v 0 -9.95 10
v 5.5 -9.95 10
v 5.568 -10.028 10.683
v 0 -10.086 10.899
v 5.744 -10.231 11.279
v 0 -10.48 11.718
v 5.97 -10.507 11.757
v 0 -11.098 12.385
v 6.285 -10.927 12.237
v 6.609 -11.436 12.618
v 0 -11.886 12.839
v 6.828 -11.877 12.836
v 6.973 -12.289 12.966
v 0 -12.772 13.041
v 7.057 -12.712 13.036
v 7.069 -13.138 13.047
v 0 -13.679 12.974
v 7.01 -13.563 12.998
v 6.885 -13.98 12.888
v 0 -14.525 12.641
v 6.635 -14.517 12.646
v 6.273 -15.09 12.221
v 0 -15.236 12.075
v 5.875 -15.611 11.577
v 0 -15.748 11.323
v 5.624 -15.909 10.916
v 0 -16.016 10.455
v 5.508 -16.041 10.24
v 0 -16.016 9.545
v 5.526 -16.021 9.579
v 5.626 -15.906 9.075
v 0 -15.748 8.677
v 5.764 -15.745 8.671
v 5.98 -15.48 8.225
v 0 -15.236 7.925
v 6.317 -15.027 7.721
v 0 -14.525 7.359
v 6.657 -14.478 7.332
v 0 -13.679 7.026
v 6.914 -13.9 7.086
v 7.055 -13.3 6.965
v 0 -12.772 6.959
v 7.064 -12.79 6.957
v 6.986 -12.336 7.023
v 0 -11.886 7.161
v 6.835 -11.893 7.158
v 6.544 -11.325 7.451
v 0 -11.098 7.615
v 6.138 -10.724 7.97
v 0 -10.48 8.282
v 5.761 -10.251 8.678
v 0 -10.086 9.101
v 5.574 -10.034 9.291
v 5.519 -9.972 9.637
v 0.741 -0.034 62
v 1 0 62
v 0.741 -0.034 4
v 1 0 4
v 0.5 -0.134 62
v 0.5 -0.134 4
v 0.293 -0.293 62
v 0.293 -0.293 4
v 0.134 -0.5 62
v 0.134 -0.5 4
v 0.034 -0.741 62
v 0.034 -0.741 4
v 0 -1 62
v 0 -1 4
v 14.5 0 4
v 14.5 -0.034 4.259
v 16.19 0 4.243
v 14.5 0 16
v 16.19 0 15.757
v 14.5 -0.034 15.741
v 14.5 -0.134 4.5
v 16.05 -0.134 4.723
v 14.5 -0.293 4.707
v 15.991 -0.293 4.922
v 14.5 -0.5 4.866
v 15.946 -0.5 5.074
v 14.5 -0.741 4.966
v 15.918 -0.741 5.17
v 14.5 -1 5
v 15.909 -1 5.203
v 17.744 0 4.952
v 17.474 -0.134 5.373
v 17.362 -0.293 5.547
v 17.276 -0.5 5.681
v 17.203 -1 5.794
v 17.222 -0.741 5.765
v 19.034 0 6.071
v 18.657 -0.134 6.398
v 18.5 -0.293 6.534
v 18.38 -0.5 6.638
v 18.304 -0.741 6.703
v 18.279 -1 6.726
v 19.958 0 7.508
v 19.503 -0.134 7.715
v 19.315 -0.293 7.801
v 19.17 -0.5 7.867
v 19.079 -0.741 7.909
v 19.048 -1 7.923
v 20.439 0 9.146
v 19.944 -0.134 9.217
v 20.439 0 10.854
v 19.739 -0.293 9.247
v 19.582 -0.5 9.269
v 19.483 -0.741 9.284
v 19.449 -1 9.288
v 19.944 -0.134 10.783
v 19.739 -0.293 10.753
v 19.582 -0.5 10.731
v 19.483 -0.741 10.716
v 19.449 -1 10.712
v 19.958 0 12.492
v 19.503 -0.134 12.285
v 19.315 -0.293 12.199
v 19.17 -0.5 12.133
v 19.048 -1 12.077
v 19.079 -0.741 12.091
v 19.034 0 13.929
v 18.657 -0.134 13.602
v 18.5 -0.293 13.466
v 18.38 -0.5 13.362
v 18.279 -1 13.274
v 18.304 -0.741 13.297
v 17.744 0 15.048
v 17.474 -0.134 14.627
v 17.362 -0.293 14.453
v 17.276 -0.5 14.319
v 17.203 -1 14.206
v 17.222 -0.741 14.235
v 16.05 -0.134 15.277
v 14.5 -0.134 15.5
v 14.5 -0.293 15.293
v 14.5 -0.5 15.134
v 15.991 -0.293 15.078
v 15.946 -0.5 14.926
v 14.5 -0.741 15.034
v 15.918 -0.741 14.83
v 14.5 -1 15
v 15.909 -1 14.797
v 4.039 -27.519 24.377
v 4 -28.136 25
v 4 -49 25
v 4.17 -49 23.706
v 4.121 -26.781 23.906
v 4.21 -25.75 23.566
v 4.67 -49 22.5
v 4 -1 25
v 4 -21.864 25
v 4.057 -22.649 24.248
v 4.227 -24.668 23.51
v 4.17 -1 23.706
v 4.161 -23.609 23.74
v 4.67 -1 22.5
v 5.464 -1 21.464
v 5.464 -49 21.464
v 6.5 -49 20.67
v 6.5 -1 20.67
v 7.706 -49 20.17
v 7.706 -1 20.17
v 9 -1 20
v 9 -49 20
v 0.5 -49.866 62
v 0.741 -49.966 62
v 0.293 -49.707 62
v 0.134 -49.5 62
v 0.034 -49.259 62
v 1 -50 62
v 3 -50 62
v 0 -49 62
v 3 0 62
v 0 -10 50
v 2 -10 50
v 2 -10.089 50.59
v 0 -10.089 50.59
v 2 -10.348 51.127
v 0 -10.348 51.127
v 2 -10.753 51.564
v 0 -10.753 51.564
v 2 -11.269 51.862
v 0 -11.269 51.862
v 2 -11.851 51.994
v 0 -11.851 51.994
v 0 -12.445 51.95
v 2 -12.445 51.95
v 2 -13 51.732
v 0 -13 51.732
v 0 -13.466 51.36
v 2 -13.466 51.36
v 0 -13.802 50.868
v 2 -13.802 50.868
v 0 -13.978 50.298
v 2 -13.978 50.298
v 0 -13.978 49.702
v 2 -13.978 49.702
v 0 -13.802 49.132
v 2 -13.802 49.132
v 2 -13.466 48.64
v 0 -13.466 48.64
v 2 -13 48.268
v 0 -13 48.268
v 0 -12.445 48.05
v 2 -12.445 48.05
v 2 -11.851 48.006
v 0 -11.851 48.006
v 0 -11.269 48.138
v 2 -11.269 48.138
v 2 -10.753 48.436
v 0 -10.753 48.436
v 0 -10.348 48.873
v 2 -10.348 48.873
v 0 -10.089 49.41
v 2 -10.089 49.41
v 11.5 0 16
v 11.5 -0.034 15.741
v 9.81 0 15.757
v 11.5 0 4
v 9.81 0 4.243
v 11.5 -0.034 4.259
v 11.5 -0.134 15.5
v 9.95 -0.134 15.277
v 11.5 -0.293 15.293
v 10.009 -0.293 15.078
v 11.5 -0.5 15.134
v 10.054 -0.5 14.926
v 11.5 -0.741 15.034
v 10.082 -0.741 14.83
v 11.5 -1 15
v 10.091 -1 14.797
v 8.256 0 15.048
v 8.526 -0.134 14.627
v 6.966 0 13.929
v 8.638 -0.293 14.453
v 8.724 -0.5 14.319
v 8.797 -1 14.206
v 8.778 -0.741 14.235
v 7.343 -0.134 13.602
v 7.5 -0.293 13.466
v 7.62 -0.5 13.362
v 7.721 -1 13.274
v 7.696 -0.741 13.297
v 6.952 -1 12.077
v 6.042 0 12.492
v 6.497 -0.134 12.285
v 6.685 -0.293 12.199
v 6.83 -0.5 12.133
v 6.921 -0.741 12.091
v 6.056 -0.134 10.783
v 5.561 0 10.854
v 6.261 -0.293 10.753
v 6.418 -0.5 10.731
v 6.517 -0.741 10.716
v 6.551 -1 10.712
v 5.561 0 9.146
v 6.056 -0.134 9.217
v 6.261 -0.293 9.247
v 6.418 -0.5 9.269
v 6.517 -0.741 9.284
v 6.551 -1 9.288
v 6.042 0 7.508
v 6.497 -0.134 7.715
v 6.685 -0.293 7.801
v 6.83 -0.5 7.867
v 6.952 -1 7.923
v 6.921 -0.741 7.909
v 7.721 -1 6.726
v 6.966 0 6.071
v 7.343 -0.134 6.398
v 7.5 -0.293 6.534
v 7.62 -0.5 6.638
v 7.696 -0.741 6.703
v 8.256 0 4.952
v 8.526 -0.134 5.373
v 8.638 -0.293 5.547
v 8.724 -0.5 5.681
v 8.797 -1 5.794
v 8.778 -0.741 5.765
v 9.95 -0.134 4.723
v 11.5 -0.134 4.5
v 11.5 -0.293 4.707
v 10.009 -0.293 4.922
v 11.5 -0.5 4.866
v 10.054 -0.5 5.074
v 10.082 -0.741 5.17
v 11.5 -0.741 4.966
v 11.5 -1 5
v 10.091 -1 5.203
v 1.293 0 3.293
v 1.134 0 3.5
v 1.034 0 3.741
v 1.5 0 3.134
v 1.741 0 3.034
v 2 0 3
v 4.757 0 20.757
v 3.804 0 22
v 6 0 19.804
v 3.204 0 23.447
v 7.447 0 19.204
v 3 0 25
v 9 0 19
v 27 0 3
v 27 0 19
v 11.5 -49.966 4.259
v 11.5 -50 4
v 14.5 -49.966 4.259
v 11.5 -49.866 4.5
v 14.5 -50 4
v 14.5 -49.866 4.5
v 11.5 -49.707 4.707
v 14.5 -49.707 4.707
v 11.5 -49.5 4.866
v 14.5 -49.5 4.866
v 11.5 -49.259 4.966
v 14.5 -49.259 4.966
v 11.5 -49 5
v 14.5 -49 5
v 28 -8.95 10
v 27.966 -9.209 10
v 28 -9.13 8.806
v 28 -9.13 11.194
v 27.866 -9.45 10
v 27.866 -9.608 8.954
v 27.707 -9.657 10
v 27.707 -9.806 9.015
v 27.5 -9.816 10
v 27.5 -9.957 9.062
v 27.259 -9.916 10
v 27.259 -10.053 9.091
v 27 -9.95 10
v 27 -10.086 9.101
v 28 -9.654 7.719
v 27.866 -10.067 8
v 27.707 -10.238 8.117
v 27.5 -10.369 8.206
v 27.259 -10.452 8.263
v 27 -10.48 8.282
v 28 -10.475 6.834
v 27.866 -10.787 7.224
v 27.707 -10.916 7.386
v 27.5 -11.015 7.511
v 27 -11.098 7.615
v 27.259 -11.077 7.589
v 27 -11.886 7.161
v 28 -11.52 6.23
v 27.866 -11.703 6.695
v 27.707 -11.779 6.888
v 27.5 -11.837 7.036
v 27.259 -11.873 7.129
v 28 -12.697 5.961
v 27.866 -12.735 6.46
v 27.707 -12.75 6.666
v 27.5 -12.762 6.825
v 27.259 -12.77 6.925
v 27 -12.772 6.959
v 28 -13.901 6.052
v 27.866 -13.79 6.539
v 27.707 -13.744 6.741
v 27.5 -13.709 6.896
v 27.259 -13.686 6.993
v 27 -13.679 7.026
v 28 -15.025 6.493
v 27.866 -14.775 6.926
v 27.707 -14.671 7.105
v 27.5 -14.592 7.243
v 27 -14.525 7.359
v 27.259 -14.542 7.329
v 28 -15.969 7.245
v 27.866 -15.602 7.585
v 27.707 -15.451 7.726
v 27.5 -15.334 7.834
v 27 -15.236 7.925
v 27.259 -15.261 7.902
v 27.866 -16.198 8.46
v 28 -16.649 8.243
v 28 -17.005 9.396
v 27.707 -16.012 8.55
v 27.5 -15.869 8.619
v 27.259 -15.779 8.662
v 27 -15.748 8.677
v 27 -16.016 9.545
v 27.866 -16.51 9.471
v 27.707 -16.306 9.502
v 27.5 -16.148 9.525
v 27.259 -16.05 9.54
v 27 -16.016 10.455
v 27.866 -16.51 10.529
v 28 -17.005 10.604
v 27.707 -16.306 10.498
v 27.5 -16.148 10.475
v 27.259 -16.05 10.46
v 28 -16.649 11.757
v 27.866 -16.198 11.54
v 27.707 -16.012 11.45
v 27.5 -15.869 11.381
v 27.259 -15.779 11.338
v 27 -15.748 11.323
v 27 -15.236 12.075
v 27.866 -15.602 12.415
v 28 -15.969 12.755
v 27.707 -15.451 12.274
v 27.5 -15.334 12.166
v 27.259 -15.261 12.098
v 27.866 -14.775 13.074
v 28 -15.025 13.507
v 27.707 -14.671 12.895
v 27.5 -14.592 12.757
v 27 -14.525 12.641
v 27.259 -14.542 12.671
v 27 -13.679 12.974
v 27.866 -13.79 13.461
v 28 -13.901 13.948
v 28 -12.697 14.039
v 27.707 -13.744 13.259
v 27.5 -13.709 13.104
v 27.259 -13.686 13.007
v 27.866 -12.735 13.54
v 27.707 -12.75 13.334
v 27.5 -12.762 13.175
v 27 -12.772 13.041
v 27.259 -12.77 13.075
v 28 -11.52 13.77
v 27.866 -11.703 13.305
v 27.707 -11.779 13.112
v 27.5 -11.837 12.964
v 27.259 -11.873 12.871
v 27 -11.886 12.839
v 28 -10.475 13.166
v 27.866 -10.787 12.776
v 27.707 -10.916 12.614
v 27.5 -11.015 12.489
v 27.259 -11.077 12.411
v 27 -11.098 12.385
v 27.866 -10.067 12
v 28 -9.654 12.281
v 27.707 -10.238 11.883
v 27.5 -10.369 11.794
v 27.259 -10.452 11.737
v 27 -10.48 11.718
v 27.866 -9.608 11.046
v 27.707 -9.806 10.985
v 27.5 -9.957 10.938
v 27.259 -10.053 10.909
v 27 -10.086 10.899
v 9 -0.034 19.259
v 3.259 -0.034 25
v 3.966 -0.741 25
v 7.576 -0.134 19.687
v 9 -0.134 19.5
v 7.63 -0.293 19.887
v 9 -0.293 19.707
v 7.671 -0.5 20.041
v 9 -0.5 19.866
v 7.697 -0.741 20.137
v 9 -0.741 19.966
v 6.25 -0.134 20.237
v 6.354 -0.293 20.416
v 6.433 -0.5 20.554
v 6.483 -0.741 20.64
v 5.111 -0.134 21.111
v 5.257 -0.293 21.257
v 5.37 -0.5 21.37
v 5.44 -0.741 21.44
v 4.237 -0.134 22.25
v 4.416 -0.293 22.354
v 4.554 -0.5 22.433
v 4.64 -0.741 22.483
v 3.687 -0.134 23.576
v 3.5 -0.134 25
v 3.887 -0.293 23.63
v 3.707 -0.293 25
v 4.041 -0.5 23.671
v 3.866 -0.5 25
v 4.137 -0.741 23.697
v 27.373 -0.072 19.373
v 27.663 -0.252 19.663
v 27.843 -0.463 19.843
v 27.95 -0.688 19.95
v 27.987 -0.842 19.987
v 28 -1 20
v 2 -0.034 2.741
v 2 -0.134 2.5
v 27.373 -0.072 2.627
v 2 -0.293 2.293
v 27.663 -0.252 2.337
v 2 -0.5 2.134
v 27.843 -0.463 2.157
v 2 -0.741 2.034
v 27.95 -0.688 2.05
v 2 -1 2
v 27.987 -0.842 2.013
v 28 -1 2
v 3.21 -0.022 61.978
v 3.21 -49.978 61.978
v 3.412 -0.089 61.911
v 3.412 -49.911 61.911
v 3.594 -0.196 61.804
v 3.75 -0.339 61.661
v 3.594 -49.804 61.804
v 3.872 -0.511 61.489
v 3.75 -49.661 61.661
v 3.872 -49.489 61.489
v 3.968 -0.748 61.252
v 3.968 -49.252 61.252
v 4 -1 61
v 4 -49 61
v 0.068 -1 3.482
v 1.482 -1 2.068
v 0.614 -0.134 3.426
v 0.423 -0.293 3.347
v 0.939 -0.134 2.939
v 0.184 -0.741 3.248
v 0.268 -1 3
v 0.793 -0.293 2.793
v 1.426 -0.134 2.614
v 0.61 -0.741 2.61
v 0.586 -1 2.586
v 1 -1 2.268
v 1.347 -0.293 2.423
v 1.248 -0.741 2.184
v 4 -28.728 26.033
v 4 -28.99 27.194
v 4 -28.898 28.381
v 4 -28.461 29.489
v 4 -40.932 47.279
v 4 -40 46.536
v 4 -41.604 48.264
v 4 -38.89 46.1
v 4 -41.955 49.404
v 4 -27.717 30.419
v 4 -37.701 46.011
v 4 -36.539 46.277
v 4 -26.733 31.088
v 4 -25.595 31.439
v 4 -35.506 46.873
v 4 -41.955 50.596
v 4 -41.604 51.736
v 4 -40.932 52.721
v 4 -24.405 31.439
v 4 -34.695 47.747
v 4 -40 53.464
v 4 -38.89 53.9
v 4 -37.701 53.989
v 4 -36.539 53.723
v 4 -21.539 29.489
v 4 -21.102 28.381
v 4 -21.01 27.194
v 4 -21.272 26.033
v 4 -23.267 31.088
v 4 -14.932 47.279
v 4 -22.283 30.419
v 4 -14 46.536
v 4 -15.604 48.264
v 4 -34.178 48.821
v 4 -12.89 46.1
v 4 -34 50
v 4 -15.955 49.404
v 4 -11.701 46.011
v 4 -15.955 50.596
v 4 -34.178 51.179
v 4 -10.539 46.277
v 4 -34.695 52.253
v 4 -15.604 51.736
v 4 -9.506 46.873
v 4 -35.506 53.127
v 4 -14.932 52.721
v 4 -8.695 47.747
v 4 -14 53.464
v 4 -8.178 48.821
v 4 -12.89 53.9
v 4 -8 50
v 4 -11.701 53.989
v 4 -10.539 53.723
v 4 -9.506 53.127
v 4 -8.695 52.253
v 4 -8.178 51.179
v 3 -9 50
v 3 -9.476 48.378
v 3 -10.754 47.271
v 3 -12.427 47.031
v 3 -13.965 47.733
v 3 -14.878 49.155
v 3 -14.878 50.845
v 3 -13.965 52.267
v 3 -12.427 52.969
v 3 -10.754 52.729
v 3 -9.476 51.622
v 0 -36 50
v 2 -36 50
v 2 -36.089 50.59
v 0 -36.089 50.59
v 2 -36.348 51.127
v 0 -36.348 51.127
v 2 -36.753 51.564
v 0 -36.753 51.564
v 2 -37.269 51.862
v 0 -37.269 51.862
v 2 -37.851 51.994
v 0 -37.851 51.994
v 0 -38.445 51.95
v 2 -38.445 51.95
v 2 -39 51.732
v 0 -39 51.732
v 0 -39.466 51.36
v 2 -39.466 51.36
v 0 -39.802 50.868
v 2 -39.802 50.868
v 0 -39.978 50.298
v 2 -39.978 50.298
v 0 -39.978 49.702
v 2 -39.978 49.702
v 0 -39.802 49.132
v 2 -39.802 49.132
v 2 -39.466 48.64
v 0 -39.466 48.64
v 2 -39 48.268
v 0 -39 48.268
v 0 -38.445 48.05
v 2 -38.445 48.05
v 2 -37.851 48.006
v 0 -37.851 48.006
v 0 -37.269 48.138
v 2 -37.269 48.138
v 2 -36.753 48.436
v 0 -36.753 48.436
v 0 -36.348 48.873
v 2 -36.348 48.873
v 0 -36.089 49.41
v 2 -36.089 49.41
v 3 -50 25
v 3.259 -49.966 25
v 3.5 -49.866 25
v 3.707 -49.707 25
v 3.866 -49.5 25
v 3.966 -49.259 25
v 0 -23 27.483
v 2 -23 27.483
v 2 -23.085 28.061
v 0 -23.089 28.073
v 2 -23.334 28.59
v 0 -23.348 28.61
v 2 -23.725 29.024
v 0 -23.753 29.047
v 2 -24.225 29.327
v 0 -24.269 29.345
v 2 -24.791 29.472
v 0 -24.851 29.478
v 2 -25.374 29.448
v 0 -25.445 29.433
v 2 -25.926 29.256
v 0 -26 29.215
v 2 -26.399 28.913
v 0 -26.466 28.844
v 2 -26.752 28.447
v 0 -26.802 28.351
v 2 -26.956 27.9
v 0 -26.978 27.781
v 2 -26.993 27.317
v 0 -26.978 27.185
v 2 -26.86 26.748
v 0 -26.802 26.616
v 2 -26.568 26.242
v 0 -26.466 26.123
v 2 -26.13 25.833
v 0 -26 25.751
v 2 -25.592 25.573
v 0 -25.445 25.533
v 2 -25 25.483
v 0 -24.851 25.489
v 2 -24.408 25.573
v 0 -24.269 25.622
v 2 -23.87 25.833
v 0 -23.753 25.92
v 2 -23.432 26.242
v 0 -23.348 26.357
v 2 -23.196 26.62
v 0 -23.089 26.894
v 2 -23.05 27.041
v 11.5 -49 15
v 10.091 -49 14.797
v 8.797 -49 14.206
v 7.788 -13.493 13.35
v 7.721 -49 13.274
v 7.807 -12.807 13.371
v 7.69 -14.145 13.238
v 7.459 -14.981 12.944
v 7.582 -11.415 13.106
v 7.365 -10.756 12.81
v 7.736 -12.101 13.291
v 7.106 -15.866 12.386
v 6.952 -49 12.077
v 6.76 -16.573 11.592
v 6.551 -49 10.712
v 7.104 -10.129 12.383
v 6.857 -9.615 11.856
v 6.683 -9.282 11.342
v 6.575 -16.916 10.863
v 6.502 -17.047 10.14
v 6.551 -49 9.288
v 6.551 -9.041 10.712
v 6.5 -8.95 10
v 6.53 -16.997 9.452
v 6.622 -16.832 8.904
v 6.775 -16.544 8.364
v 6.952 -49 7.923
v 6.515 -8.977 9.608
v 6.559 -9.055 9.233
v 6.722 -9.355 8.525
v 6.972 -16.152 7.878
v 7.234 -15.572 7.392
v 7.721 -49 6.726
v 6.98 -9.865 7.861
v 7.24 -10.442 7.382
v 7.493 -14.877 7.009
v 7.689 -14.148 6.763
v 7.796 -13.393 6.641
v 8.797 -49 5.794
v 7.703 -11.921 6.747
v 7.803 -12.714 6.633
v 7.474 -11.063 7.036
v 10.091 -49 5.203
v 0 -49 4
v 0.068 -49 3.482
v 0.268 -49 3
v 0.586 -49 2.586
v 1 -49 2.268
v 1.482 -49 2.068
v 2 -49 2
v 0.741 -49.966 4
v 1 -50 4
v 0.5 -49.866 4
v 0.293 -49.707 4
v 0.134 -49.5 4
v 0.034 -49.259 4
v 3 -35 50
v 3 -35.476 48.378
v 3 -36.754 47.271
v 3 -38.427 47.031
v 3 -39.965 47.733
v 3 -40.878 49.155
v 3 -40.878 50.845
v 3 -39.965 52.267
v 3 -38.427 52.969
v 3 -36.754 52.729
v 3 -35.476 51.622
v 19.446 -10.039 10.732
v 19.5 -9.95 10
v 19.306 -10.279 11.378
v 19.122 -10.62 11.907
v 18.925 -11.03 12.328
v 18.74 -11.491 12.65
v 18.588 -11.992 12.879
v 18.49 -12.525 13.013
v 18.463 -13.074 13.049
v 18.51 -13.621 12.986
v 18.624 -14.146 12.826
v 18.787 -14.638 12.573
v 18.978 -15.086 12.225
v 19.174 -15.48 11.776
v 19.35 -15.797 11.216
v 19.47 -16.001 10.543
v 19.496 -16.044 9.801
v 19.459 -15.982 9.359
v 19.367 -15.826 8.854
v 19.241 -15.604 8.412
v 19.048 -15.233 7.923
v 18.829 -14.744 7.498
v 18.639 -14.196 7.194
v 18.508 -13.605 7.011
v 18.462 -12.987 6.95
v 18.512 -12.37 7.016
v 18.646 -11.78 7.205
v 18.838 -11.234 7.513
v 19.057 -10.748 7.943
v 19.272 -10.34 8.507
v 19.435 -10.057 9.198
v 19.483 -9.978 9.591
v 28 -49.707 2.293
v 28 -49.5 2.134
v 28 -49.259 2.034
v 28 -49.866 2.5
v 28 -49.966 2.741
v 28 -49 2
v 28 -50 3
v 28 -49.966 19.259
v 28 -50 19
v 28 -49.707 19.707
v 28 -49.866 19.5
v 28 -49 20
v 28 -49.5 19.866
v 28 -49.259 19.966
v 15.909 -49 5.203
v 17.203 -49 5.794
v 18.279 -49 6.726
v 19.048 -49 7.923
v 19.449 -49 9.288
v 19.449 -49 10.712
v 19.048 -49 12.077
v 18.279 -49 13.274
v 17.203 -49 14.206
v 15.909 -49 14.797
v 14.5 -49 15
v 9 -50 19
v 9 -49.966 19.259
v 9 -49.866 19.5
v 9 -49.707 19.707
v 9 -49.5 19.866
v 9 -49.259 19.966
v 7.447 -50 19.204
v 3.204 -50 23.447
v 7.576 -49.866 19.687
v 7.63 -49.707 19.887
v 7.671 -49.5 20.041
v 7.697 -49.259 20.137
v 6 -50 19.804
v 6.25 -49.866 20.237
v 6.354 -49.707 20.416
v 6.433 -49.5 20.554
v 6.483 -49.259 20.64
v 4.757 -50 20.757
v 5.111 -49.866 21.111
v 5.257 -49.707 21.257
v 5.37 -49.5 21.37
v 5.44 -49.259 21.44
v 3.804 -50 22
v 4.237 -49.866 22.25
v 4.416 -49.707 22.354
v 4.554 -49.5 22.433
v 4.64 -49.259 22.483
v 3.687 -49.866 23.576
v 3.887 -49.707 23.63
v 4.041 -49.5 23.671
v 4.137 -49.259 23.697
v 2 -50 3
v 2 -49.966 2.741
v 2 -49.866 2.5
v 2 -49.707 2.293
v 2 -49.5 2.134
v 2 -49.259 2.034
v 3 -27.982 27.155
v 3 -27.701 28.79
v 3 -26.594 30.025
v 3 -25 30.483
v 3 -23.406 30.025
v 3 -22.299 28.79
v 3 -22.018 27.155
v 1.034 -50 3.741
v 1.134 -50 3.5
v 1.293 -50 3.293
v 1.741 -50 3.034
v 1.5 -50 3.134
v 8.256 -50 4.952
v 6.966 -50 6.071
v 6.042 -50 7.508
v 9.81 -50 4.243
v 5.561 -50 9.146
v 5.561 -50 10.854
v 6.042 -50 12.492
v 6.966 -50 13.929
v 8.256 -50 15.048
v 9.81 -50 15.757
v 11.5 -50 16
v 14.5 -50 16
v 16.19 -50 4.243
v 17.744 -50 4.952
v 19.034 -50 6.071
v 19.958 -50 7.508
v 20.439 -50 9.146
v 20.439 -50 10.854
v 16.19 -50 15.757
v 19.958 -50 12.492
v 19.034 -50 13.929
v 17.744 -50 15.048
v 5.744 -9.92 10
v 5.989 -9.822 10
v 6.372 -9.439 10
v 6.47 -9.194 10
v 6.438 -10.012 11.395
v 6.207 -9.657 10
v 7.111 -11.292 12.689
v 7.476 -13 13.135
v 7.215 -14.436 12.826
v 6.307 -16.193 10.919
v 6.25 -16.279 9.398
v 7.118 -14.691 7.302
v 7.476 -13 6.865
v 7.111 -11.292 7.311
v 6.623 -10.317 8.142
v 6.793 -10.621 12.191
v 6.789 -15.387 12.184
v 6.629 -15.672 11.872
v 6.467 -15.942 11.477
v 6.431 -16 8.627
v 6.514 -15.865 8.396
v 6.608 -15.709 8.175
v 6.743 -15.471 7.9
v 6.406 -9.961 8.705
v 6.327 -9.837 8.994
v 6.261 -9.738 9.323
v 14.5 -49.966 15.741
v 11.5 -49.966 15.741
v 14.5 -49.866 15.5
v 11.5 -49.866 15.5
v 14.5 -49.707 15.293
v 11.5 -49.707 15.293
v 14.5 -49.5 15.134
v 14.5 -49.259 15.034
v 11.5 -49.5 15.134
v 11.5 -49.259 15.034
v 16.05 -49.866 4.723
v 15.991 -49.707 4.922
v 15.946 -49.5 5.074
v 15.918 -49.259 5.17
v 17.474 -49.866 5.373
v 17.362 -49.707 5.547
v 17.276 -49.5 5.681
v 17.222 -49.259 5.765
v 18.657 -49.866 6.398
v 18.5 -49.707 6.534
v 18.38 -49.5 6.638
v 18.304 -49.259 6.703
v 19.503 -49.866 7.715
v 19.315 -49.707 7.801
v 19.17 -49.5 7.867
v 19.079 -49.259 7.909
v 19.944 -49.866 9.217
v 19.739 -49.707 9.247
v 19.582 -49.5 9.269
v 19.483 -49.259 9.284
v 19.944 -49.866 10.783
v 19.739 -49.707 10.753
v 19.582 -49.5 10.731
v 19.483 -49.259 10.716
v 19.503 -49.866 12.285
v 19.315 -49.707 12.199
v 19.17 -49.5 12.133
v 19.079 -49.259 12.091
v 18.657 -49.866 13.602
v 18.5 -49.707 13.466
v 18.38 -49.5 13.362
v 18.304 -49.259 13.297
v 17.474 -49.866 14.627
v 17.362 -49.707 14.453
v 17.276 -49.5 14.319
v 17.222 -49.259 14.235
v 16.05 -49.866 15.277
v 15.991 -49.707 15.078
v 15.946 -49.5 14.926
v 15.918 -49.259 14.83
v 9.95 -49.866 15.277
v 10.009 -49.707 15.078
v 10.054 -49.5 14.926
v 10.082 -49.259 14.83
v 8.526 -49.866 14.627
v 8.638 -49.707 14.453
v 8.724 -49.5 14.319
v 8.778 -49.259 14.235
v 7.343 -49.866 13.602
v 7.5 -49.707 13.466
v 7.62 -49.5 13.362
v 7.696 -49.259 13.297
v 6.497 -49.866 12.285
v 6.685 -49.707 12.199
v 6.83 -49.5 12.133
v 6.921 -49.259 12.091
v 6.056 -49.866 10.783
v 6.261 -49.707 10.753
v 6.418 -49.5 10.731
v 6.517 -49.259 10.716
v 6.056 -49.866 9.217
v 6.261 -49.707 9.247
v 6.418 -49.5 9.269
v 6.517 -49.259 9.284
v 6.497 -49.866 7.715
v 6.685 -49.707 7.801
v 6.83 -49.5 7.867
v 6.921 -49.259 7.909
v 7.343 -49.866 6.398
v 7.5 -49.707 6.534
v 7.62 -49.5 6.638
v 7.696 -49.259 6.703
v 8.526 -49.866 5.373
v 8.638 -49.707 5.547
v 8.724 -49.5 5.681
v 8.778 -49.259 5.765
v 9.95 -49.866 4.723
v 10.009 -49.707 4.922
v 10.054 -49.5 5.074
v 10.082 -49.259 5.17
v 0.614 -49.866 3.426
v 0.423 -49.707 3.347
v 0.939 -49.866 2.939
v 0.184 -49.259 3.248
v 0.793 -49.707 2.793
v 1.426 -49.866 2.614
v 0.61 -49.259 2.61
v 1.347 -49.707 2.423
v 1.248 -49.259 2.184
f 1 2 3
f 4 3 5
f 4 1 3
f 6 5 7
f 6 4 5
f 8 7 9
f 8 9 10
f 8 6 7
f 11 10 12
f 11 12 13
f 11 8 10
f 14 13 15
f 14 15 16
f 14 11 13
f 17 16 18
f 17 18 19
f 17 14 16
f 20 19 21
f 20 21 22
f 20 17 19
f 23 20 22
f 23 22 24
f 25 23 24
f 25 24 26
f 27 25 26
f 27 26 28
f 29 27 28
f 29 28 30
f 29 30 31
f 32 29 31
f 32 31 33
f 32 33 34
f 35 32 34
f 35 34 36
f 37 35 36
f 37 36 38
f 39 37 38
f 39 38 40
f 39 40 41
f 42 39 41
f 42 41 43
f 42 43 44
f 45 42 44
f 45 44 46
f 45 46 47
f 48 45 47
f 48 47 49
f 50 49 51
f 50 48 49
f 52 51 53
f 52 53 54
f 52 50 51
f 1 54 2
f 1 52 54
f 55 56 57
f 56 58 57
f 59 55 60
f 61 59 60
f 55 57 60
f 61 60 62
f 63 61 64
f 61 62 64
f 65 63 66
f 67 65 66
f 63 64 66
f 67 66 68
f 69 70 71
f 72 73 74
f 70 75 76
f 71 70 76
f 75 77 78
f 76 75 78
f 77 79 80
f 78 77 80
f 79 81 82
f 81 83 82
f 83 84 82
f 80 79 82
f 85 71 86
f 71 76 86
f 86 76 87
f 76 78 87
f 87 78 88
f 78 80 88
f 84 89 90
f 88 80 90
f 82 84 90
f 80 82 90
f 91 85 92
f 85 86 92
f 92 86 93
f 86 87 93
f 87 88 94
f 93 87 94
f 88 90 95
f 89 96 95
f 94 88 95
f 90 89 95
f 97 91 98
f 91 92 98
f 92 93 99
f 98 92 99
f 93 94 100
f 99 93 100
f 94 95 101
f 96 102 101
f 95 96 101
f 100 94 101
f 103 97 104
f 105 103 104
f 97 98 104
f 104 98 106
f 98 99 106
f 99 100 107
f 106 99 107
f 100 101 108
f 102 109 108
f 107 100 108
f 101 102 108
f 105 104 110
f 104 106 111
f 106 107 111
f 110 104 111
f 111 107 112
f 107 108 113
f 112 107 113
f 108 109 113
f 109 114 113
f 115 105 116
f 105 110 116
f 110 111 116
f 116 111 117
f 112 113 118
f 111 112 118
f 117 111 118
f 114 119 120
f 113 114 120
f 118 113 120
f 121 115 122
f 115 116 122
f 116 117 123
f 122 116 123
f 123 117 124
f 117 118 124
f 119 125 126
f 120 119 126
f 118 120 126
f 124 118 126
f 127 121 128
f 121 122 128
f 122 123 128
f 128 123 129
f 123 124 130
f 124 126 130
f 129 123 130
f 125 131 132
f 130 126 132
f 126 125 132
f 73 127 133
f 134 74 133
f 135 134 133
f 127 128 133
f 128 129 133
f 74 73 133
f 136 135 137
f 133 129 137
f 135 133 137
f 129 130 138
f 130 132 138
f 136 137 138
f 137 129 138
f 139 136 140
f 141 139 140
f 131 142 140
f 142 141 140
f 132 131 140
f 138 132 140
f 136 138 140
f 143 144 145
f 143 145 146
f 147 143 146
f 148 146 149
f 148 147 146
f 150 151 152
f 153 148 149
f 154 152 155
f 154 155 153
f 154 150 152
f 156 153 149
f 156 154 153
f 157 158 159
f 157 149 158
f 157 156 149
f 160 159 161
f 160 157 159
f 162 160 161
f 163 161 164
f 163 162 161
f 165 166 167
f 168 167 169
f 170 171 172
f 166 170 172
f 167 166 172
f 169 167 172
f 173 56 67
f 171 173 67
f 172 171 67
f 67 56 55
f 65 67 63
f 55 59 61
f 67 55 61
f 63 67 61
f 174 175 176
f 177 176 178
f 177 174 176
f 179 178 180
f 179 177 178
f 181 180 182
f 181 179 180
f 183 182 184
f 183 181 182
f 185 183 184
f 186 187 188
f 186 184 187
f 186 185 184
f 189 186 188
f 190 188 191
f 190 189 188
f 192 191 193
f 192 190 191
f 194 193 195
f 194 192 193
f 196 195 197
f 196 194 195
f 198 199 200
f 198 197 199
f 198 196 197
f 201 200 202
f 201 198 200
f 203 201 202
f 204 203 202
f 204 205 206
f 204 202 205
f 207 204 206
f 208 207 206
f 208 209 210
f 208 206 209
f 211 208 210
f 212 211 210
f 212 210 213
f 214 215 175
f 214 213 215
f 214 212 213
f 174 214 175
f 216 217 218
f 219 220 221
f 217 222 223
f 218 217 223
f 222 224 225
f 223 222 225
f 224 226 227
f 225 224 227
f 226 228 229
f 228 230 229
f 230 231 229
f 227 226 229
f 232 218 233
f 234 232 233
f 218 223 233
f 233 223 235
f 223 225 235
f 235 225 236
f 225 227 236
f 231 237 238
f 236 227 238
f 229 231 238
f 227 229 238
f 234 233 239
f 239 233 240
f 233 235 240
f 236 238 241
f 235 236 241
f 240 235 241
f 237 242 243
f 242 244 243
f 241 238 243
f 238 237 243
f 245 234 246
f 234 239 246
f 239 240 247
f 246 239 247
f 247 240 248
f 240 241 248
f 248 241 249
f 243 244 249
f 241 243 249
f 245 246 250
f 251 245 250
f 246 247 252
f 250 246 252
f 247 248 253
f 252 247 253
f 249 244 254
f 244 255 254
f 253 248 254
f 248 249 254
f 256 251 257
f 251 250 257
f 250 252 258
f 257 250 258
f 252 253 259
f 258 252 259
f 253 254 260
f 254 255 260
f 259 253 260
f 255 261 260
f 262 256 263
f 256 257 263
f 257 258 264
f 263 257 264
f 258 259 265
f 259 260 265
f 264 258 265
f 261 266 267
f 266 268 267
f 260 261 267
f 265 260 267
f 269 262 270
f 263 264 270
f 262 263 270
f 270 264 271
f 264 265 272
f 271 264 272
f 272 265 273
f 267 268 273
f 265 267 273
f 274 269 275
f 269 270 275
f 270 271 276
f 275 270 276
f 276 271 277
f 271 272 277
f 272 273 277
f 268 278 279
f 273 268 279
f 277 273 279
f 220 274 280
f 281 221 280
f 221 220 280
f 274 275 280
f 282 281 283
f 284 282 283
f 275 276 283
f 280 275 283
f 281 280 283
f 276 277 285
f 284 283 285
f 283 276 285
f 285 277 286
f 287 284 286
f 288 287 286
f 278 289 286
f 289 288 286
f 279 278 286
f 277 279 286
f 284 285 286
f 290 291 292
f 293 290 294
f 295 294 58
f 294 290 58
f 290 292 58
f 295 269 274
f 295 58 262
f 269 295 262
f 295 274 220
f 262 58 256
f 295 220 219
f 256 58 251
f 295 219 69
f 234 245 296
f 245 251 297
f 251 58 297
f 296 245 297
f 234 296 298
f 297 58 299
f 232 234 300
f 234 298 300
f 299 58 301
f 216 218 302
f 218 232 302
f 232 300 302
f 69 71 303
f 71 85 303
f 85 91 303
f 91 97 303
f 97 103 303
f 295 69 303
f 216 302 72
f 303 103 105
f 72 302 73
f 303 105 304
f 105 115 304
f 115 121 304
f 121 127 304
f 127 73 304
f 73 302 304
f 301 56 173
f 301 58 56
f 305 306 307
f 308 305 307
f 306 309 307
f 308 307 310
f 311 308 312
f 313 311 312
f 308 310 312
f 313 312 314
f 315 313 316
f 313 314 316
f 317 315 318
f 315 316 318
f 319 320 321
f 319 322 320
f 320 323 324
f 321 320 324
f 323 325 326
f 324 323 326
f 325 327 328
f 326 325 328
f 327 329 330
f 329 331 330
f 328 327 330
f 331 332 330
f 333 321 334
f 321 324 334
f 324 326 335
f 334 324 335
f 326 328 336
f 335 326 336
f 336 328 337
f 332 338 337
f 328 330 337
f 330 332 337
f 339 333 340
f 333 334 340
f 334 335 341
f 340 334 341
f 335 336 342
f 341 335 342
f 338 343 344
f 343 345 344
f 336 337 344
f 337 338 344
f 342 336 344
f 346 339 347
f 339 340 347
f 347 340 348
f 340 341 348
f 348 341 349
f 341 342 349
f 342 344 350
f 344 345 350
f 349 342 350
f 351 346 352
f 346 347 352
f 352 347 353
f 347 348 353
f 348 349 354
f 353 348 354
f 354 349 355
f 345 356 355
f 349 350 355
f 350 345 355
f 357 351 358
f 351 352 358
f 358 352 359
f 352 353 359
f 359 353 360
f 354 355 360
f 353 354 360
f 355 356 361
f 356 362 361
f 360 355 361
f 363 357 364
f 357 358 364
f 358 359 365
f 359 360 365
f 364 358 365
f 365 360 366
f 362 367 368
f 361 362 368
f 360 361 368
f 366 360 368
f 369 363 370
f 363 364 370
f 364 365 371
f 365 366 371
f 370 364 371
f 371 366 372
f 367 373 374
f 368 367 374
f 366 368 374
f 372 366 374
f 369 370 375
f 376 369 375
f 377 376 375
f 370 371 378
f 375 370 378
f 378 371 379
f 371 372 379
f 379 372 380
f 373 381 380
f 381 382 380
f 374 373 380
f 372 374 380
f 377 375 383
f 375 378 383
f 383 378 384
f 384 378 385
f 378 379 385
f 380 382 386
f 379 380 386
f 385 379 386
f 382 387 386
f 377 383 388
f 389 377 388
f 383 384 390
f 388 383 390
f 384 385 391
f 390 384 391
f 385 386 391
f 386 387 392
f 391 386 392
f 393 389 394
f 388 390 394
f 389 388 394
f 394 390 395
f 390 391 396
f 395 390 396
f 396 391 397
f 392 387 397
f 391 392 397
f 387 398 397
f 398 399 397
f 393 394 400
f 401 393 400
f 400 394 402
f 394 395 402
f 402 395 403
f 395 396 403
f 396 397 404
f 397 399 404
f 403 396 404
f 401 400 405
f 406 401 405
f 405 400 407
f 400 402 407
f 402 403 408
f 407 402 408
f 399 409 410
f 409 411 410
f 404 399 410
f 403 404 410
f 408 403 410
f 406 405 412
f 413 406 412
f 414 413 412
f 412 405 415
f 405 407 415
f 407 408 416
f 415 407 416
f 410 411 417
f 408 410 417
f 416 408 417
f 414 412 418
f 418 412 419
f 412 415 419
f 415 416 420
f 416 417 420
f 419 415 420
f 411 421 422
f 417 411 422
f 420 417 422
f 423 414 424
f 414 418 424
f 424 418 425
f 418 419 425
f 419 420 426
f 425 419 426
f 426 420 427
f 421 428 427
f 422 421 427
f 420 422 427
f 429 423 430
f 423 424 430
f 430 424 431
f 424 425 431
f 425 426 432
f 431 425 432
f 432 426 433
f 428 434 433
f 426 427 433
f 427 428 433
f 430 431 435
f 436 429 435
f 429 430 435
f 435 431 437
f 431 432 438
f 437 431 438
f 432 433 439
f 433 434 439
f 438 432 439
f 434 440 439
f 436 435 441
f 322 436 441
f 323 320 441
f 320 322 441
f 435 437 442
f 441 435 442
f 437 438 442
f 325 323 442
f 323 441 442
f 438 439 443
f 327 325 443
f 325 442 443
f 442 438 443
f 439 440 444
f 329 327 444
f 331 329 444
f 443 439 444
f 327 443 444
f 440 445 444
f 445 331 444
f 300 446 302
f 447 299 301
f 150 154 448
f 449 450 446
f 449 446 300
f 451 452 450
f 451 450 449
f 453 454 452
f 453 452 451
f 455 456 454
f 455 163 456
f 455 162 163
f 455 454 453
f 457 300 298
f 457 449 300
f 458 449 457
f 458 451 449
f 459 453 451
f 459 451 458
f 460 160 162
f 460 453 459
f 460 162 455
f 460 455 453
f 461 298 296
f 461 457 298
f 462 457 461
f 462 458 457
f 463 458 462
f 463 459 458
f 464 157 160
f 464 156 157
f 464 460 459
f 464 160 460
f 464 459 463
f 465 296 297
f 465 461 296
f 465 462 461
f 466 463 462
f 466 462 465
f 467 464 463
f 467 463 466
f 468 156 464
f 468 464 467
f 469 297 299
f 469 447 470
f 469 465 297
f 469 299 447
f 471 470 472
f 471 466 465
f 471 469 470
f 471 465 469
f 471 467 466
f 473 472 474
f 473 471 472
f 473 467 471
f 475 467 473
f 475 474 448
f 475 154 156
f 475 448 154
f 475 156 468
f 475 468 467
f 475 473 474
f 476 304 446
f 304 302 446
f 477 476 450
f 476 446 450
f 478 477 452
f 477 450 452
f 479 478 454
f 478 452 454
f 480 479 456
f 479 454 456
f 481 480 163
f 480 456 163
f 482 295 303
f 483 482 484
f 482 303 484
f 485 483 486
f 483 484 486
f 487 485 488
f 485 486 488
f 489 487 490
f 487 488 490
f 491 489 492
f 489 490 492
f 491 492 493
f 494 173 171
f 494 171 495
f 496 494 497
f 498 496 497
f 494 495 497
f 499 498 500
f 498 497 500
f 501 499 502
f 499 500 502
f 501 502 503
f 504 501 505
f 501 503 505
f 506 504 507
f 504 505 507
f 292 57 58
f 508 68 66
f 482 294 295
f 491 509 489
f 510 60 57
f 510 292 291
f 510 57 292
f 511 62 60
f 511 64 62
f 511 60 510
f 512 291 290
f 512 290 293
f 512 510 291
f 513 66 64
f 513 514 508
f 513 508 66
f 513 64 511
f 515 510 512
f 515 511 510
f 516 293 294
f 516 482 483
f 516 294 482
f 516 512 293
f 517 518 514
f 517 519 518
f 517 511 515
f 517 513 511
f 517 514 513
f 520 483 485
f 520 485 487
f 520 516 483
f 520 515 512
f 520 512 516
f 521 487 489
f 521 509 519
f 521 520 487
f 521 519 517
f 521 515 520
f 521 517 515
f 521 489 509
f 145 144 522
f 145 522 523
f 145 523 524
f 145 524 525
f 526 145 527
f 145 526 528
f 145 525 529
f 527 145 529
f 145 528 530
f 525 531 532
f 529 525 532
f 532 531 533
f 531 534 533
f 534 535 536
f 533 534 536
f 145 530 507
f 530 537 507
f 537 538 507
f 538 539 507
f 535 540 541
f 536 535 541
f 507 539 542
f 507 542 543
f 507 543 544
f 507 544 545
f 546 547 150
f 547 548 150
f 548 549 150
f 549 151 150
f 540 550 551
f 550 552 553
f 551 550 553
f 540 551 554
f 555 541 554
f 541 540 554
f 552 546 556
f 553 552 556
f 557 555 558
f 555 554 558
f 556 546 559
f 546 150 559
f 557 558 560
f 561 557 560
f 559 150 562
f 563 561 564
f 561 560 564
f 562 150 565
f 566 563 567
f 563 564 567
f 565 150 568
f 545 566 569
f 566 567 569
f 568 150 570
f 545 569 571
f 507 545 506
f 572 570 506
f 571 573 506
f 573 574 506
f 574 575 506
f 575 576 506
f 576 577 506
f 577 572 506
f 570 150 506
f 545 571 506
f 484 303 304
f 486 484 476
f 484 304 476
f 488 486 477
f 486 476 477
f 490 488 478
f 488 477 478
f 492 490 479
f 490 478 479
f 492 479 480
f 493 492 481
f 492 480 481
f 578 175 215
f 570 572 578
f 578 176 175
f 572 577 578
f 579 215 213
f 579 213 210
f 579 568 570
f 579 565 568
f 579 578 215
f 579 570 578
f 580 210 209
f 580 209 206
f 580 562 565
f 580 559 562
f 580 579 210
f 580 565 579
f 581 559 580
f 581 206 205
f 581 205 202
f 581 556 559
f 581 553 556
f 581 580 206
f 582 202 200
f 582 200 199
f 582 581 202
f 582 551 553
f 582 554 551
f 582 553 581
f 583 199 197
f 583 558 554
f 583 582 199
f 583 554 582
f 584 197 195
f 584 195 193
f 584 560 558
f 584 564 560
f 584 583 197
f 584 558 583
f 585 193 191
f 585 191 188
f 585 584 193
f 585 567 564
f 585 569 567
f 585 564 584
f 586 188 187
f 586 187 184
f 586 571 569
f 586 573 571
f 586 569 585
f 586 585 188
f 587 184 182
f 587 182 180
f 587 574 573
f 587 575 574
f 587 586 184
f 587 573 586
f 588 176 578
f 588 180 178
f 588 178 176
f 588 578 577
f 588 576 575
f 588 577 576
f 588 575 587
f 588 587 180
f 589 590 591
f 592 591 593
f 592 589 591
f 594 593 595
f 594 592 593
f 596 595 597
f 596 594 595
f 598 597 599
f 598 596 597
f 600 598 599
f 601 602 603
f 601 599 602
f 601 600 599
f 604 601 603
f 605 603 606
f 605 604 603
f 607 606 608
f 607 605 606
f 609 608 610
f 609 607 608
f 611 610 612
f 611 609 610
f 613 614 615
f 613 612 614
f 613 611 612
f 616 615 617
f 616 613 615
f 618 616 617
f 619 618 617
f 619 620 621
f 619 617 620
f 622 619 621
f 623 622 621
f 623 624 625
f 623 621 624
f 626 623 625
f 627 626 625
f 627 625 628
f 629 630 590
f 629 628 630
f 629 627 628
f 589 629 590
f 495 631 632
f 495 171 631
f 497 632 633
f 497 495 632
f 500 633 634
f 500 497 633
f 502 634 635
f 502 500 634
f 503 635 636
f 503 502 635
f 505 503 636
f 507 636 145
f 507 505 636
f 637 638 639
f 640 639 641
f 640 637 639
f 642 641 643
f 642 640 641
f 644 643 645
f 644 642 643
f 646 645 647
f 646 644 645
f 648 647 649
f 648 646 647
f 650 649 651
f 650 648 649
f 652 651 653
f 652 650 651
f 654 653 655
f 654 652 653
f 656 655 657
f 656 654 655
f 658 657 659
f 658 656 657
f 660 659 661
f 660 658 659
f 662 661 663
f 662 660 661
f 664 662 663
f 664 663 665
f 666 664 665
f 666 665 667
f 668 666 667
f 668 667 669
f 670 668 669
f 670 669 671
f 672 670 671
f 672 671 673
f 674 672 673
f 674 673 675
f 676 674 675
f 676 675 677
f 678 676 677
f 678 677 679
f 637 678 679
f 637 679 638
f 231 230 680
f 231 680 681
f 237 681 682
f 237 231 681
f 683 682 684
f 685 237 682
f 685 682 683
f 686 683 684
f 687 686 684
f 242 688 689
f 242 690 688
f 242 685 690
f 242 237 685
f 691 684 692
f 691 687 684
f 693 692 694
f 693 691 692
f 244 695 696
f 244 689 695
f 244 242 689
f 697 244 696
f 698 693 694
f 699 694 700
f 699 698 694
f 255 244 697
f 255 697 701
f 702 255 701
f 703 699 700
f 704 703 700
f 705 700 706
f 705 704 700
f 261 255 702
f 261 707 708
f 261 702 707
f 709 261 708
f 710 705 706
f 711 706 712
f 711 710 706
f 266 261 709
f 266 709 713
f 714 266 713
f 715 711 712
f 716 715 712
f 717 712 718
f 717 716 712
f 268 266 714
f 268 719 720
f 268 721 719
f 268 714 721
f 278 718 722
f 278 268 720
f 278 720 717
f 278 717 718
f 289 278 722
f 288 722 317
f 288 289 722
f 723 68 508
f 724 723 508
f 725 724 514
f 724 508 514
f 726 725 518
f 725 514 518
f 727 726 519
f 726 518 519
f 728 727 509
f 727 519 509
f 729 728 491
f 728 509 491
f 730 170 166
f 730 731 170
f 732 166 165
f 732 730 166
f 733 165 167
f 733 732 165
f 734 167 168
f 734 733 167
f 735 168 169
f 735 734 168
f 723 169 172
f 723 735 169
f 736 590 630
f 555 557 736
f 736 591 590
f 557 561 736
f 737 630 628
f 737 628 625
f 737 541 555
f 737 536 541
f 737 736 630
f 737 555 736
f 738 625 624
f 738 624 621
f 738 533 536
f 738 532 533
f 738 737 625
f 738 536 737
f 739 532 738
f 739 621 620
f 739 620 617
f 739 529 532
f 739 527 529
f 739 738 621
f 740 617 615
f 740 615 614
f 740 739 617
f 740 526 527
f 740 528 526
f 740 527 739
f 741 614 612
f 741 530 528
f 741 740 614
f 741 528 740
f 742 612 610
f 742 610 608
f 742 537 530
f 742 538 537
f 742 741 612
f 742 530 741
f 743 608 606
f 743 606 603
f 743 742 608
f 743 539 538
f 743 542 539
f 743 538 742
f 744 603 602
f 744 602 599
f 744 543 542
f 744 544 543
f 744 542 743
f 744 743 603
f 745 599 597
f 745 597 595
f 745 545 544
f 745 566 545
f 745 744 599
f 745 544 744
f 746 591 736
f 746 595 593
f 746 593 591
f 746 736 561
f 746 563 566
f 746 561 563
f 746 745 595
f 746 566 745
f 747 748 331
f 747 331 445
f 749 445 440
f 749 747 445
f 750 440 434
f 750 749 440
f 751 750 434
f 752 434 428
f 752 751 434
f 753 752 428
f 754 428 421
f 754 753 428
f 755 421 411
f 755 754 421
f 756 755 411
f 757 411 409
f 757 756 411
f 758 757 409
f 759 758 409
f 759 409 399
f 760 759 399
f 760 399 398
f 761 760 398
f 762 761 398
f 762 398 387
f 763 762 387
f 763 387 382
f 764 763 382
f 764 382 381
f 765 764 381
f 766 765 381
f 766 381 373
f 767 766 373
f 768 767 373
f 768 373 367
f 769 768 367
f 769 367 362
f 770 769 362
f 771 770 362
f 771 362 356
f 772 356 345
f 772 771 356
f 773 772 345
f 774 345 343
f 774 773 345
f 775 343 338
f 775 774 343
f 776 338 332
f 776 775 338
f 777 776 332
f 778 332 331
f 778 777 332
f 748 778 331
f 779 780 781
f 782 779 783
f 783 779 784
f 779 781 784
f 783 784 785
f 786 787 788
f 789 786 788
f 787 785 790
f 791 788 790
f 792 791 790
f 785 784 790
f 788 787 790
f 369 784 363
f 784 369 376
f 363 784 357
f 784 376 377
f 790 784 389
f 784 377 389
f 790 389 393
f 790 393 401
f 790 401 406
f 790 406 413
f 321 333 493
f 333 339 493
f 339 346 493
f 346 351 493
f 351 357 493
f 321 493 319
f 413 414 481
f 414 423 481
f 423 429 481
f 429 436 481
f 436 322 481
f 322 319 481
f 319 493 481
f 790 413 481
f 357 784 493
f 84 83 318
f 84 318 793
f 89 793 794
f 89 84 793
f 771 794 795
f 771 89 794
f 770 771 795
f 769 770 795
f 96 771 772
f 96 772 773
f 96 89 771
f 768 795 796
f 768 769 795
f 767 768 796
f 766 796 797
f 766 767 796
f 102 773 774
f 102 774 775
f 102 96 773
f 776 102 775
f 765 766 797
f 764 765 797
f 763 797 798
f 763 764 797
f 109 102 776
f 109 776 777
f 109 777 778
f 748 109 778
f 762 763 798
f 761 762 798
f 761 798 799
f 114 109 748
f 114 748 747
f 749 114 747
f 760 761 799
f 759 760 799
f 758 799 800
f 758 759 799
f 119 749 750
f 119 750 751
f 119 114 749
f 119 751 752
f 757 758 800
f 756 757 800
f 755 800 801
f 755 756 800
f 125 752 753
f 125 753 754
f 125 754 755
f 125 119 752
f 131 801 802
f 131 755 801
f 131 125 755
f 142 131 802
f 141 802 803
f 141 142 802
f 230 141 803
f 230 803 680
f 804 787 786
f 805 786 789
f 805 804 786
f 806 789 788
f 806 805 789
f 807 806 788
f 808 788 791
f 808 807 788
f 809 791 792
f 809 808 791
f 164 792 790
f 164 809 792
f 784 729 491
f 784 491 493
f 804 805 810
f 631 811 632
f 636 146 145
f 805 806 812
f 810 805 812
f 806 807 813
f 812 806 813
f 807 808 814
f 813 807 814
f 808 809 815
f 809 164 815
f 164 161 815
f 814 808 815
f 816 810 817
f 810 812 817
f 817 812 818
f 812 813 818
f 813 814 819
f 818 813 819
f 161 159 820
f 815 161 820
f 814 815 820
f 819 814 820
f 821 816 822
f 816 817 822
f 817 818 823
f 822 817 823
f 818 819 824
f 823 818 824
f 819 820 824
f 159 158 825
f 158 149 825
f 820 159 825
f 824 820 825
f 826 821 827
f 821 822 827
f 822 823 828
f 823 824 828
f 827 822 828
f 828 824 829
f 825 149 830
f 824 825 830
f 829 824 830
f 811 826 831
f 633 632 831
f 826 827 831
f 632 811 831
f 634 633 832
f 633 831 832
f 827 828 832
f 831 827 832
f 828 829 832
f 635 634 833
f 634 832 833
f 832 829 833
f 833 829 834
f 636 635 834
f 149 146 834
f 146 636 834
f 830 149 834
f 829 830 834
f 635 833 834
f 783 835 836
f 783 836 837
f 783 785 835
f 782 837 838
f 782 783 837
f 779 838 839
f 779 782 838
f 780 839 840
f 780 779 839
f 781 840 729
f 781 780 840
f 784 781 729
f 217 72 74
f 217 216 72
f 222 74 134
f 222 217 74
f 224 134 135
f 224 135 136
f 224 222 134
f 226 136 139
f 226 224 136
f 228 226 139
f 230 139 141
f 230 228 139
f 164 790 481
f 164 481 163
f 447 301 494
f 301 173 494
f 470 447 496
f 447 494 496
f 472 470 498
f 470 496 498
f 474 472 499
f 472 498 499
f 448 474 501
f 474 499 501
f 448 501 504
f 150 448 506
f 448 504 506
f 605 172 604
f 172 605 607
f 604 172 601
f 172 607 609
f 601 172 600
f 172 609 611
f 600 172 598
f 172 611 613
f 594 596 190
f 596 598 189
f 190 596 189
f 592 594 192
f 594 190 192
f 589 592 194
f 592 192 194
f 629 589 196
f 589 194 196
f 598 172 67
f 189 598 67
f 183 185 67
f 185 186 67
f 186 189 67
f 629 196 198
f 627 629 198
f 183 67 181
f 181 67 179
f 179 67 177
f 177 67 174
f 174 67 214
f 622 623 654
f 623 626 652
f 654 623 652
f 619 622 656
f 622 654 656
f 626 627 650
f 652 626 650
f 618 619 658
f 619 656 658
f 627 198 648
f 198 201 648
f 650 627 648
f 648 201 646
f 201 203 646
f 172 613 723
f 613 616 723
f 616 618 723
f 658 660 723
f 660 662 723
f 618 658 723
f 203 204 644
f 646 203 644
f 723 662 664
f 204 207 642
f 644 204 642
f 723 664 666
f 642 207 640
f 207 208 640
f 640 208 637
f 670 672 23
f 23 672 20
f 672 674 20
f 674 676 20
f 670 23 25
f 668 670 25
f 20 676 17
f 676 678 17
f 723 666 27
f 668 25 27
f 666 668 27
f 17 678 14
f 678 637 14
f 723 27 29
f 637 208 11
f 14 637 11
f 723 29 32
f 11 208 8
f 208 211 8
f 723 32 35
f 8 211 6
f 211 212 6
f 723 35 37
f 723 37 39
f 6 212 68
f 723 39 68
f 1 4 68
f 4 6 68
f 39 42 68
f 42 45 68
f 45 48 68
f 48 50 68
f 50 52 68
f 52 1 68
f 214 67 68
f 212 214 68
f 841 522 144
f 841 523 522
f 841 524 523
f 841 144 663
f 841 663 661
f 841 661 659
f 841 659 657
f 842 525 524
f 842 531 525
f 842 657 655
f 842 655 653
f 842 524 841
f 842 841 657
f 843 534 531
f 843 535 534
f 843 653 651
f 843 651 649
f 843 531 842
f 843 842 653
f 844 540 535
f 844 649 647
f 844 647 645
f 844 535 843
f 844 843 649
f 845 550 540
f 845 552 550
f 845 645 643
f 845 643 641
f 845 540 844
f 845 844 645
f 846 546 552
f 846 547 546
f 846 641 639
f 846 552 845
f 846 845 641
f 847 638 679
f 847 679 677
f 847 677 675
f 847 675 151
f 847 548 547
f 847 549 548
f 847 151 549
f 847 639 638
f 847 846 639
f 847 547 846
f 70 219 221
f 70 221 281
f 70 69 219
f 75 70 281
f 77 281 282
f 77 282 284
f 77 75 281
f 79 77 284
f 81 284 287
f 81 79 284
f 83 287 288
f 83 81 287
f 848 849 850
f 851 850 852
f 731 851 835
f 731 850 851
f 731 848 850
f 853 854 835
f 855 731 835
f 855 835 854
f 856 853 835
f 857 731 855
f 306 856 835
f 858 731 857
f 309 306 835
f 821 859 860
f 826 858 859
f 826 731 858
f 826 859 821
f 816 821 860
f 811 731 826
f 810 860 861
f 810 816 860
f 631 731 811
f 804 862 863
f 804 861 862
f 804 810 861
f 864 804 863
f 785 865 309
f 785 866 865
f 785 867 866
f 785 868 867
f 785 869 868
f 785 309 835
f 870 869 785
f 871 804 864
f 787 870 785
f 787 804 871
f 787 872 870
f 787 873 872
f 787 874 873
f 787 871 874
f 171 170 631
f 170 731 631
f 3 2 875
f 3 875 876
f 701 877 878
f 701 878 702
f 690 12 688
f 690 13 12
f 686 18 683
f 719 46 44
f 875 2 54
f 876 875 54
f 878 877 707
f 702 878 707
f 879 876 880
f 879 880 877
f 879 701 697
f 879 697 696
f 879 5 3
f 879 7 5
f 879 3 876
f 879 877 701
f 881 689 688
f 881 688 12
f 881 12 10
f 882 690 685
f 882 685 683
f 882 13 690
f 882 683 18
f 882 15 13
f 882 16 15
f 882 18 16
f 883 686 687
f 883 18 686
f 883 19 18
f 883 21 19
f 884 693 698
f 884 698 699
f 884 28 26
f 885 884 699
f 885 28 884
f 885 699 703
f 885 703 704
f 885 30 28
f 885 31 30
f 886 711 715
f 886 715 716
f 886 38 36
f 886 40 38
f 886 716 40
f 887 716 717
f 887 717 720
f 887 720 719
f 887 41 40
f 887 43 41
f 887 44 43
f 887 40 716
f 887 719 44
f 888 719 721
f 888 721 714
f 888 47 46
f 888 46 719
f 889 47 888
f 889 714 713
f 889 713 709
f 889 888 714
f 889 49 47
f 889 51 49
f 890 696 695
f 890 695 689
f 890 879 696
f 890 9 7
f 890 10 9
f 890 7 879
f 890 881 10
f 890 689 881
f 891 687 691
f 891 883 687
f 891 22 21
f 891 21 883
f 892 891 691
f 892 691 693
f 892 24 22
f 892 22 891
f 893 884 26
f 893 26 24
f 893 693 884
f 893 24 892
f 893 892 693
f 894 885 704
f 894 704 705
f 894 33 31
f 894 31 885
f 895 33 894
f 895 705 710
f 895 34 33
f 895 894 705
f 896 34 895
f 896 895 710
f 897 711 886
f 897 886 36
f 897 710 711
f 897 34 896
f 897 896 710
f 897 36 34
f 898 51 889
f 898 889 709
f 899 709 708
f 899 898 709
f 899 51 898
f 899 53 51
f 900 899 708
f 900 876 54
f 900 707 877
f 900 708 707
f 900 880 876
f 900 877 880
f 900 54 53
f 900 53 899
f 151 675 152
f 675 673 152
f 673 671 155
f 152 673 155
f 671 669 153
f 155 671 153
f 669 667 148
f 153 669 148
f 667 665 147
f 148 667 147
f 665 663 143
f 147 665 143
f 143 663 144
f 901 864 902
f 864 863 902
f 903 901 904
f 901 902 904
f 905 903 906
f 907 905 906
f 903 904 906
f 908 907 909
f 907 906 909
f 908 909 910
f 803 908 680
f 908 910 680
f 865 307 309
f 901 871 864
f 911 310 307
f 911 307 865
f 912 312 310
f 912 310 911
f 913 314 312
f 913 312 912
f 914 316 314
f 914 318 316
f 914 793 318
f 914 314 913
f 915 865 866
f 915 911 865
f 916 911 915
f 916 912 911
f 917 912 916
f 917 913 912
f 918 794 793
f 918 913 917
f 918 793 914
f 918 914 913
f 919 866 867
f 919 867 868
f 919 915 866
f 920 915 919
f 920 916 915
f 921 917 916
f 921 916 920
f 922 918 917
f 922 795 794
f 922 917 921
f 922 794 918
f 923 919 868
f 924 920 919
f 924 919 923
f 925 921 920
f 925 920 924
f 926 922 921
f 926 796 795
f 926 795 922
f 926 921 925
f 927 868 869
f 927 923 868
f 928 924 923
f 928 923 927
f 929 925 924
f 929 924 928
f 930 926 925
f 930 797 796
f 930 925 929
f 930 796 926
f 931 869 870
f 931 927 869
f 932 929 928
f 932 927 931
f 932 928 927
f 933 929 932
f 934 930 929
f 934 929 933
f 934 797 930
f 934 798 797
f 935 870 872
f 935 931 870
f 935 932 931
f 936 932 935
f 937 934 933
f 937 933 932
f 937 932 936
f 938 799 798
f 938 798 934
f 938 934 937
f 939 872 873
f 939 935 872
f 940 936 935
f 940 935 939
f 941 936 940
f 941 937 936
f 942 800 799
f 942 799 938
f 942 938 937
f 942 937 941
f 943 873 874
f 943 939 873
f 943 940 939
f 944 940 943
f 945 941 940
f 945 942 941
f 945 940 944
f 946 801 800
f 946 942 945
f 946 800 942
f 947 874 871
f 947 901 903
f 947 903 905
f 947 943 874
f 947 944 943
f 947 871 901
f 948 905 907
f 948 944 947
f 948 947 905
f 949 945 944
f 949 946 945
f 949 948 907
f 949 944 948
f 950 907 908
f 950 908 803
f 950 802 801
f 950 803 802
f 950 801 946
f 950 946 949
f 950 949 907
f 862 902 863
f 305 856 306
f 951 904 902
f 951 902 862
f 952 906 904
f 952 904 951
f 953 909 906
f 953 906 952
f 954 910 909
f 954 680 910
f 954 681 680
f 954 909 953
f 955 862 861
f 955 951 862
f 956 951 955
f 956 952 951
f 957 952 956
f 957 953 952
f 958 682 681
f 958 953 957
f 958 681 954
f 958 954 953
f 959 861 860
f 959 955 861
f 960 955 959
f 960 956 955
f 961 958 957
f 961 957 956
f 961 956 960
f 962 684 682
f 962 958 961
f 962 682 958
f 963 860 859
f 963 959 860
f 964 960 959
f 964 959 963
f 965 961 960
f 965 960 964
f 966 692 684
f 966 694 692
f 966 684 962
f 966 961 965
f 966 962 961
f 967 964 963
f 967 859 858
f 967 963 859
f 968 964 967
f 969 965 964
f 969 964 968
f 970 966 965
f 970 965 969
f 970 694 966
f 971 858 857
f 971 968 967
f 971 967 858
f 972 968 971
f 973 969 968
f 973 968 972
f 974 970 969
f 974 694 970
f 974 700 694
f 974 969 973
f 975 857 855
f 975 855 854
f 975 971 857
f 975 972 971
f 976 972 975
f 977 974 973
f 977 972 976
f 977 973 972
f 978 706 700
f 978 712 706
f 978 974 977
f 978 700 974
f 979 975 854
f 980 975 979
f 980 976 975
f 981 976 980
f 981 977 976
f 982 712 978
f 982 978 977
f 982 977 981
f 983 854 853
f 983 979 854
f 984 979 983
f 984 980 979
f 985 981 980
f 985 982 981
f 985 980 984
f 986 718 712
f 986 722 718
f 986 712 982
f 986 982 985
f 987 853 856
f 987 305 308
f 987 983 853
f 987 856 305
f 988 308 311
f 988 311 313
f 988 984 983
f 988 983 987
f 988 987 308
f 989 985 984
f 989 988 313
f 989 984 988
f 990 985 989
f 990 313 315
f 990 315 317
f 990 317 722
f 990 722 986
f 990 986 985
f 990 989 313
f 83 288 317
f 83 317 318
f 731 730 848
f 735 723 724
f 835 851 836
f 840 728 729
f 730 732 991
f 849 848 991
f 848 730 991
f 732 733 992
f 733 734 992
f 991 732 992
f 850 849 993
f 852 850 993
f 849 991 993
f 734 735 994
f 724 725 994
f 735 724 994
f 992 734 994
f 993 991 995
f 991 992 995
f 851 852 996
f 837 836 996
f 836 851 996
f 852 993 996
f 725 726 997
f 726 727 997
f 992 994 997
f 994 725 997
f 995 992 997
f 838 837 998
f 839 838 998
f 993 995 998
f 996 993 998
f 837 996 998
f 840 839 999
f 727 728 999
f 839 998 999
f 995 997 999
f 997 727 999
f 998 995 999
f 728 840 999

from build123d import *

# Parameters (mm, degrees)
PAD002_DEPTH    = 50
SKETCH022_R     = 3.05
SKETCH022_R_2   = 2
POCKET006_DEPTH = 35
FILLET004_R     = 1
CHAMFER005_SIZE = 2


with BuildPart() as part:
    # Sketch021 → Pad002 (new body)
    with BuildSketch(Plane.XZ):
        with BuildLine():
            Line((0, 62), (0, 4))
            ThreePointArc((0, 4), (0.585786, 2.585786), (2, 2))
            Line((2, 2), (28, 2))
            Line((28, 2), (28, 20))
            Line((28, 20), (9, 20))
            ThreePointArc((4, 25), (5.464466, 21.464466), (9, 20))
            Line((4, 25), (4, 62))
            Line((4, 62), (0, 62))
        make_face()
        with BuildLine():
            ThreePointArc((11.5, 15), (6.5, 10), (11.5, 5))
            Line((11.5, 5), (14.5, 5))
            ThreePointArc((14.5, 5), (19.5, 10), (14.5, 15))
            Line((14.5, 15), (11.5, 15))
        make_face(mode=Mode.SUBTRACT)
    extrude(amount=PAD002_DEPTH)

    # Sketch022 → Pocket006 (cut)
    with BuildSketch(Plane.YZ):
        with Locations((-13, 10)):
            Circle(SKETCH022_R)
        with Locations((-38, 50)):
            Circle(SKETCH022_R_2)
        with Locations((-12, 50)):
            Circle(SKETCH022_R_2)
        with Locations((-25, 27.48334)):
            Circle(SKETCH022_R_2)
    extrude(amount=POCKET006_DEPTH, mode=Mode.SUBTRACT)

    # Fillet004
    fillet004_edges = [part.edges().sort_by_distance(p)[0] for p in [
        (4, 0, 43.5),
        (4, -25, 62),
        (4, -50, 43.5),
        (15, 0, 2),
        (18.5, 0, 20),
        (28, 0, 11),
        (18.5, -50, 20),
        (5.464466, -50, 21.464466),
        (5.464466, 0, 21.464466),
        (15, -50, 2),
        (0.585786, -50, 2.585786),
        (0.585786, 0, 2.585786),
        (6.5, 0, 10),
        (19.5, 0, 10),
        (13, 0, 5),
        (13, 0, 15),
        (28, -16.05, 10),
        (6.5, -16.05, 10),
        (6.5, -50, 10),
        (19.5, -50, 10),
        (13, -50, 15),
        (13, -50, 5),
    ]]
    fillet(fillet004_edges, radius=FILLET004_R)

    # Chamfer005
    chamfer005_edges = [part.edges().sort_by_distance(p)[0] for p in [
        (4, -27, 27.48334),
        (4, -40, 50),
        (4, -14, 50),
    ]]
    chamfer(chamfer005_edges, length=CHAMFER005_SIZE)


solid = part.part
